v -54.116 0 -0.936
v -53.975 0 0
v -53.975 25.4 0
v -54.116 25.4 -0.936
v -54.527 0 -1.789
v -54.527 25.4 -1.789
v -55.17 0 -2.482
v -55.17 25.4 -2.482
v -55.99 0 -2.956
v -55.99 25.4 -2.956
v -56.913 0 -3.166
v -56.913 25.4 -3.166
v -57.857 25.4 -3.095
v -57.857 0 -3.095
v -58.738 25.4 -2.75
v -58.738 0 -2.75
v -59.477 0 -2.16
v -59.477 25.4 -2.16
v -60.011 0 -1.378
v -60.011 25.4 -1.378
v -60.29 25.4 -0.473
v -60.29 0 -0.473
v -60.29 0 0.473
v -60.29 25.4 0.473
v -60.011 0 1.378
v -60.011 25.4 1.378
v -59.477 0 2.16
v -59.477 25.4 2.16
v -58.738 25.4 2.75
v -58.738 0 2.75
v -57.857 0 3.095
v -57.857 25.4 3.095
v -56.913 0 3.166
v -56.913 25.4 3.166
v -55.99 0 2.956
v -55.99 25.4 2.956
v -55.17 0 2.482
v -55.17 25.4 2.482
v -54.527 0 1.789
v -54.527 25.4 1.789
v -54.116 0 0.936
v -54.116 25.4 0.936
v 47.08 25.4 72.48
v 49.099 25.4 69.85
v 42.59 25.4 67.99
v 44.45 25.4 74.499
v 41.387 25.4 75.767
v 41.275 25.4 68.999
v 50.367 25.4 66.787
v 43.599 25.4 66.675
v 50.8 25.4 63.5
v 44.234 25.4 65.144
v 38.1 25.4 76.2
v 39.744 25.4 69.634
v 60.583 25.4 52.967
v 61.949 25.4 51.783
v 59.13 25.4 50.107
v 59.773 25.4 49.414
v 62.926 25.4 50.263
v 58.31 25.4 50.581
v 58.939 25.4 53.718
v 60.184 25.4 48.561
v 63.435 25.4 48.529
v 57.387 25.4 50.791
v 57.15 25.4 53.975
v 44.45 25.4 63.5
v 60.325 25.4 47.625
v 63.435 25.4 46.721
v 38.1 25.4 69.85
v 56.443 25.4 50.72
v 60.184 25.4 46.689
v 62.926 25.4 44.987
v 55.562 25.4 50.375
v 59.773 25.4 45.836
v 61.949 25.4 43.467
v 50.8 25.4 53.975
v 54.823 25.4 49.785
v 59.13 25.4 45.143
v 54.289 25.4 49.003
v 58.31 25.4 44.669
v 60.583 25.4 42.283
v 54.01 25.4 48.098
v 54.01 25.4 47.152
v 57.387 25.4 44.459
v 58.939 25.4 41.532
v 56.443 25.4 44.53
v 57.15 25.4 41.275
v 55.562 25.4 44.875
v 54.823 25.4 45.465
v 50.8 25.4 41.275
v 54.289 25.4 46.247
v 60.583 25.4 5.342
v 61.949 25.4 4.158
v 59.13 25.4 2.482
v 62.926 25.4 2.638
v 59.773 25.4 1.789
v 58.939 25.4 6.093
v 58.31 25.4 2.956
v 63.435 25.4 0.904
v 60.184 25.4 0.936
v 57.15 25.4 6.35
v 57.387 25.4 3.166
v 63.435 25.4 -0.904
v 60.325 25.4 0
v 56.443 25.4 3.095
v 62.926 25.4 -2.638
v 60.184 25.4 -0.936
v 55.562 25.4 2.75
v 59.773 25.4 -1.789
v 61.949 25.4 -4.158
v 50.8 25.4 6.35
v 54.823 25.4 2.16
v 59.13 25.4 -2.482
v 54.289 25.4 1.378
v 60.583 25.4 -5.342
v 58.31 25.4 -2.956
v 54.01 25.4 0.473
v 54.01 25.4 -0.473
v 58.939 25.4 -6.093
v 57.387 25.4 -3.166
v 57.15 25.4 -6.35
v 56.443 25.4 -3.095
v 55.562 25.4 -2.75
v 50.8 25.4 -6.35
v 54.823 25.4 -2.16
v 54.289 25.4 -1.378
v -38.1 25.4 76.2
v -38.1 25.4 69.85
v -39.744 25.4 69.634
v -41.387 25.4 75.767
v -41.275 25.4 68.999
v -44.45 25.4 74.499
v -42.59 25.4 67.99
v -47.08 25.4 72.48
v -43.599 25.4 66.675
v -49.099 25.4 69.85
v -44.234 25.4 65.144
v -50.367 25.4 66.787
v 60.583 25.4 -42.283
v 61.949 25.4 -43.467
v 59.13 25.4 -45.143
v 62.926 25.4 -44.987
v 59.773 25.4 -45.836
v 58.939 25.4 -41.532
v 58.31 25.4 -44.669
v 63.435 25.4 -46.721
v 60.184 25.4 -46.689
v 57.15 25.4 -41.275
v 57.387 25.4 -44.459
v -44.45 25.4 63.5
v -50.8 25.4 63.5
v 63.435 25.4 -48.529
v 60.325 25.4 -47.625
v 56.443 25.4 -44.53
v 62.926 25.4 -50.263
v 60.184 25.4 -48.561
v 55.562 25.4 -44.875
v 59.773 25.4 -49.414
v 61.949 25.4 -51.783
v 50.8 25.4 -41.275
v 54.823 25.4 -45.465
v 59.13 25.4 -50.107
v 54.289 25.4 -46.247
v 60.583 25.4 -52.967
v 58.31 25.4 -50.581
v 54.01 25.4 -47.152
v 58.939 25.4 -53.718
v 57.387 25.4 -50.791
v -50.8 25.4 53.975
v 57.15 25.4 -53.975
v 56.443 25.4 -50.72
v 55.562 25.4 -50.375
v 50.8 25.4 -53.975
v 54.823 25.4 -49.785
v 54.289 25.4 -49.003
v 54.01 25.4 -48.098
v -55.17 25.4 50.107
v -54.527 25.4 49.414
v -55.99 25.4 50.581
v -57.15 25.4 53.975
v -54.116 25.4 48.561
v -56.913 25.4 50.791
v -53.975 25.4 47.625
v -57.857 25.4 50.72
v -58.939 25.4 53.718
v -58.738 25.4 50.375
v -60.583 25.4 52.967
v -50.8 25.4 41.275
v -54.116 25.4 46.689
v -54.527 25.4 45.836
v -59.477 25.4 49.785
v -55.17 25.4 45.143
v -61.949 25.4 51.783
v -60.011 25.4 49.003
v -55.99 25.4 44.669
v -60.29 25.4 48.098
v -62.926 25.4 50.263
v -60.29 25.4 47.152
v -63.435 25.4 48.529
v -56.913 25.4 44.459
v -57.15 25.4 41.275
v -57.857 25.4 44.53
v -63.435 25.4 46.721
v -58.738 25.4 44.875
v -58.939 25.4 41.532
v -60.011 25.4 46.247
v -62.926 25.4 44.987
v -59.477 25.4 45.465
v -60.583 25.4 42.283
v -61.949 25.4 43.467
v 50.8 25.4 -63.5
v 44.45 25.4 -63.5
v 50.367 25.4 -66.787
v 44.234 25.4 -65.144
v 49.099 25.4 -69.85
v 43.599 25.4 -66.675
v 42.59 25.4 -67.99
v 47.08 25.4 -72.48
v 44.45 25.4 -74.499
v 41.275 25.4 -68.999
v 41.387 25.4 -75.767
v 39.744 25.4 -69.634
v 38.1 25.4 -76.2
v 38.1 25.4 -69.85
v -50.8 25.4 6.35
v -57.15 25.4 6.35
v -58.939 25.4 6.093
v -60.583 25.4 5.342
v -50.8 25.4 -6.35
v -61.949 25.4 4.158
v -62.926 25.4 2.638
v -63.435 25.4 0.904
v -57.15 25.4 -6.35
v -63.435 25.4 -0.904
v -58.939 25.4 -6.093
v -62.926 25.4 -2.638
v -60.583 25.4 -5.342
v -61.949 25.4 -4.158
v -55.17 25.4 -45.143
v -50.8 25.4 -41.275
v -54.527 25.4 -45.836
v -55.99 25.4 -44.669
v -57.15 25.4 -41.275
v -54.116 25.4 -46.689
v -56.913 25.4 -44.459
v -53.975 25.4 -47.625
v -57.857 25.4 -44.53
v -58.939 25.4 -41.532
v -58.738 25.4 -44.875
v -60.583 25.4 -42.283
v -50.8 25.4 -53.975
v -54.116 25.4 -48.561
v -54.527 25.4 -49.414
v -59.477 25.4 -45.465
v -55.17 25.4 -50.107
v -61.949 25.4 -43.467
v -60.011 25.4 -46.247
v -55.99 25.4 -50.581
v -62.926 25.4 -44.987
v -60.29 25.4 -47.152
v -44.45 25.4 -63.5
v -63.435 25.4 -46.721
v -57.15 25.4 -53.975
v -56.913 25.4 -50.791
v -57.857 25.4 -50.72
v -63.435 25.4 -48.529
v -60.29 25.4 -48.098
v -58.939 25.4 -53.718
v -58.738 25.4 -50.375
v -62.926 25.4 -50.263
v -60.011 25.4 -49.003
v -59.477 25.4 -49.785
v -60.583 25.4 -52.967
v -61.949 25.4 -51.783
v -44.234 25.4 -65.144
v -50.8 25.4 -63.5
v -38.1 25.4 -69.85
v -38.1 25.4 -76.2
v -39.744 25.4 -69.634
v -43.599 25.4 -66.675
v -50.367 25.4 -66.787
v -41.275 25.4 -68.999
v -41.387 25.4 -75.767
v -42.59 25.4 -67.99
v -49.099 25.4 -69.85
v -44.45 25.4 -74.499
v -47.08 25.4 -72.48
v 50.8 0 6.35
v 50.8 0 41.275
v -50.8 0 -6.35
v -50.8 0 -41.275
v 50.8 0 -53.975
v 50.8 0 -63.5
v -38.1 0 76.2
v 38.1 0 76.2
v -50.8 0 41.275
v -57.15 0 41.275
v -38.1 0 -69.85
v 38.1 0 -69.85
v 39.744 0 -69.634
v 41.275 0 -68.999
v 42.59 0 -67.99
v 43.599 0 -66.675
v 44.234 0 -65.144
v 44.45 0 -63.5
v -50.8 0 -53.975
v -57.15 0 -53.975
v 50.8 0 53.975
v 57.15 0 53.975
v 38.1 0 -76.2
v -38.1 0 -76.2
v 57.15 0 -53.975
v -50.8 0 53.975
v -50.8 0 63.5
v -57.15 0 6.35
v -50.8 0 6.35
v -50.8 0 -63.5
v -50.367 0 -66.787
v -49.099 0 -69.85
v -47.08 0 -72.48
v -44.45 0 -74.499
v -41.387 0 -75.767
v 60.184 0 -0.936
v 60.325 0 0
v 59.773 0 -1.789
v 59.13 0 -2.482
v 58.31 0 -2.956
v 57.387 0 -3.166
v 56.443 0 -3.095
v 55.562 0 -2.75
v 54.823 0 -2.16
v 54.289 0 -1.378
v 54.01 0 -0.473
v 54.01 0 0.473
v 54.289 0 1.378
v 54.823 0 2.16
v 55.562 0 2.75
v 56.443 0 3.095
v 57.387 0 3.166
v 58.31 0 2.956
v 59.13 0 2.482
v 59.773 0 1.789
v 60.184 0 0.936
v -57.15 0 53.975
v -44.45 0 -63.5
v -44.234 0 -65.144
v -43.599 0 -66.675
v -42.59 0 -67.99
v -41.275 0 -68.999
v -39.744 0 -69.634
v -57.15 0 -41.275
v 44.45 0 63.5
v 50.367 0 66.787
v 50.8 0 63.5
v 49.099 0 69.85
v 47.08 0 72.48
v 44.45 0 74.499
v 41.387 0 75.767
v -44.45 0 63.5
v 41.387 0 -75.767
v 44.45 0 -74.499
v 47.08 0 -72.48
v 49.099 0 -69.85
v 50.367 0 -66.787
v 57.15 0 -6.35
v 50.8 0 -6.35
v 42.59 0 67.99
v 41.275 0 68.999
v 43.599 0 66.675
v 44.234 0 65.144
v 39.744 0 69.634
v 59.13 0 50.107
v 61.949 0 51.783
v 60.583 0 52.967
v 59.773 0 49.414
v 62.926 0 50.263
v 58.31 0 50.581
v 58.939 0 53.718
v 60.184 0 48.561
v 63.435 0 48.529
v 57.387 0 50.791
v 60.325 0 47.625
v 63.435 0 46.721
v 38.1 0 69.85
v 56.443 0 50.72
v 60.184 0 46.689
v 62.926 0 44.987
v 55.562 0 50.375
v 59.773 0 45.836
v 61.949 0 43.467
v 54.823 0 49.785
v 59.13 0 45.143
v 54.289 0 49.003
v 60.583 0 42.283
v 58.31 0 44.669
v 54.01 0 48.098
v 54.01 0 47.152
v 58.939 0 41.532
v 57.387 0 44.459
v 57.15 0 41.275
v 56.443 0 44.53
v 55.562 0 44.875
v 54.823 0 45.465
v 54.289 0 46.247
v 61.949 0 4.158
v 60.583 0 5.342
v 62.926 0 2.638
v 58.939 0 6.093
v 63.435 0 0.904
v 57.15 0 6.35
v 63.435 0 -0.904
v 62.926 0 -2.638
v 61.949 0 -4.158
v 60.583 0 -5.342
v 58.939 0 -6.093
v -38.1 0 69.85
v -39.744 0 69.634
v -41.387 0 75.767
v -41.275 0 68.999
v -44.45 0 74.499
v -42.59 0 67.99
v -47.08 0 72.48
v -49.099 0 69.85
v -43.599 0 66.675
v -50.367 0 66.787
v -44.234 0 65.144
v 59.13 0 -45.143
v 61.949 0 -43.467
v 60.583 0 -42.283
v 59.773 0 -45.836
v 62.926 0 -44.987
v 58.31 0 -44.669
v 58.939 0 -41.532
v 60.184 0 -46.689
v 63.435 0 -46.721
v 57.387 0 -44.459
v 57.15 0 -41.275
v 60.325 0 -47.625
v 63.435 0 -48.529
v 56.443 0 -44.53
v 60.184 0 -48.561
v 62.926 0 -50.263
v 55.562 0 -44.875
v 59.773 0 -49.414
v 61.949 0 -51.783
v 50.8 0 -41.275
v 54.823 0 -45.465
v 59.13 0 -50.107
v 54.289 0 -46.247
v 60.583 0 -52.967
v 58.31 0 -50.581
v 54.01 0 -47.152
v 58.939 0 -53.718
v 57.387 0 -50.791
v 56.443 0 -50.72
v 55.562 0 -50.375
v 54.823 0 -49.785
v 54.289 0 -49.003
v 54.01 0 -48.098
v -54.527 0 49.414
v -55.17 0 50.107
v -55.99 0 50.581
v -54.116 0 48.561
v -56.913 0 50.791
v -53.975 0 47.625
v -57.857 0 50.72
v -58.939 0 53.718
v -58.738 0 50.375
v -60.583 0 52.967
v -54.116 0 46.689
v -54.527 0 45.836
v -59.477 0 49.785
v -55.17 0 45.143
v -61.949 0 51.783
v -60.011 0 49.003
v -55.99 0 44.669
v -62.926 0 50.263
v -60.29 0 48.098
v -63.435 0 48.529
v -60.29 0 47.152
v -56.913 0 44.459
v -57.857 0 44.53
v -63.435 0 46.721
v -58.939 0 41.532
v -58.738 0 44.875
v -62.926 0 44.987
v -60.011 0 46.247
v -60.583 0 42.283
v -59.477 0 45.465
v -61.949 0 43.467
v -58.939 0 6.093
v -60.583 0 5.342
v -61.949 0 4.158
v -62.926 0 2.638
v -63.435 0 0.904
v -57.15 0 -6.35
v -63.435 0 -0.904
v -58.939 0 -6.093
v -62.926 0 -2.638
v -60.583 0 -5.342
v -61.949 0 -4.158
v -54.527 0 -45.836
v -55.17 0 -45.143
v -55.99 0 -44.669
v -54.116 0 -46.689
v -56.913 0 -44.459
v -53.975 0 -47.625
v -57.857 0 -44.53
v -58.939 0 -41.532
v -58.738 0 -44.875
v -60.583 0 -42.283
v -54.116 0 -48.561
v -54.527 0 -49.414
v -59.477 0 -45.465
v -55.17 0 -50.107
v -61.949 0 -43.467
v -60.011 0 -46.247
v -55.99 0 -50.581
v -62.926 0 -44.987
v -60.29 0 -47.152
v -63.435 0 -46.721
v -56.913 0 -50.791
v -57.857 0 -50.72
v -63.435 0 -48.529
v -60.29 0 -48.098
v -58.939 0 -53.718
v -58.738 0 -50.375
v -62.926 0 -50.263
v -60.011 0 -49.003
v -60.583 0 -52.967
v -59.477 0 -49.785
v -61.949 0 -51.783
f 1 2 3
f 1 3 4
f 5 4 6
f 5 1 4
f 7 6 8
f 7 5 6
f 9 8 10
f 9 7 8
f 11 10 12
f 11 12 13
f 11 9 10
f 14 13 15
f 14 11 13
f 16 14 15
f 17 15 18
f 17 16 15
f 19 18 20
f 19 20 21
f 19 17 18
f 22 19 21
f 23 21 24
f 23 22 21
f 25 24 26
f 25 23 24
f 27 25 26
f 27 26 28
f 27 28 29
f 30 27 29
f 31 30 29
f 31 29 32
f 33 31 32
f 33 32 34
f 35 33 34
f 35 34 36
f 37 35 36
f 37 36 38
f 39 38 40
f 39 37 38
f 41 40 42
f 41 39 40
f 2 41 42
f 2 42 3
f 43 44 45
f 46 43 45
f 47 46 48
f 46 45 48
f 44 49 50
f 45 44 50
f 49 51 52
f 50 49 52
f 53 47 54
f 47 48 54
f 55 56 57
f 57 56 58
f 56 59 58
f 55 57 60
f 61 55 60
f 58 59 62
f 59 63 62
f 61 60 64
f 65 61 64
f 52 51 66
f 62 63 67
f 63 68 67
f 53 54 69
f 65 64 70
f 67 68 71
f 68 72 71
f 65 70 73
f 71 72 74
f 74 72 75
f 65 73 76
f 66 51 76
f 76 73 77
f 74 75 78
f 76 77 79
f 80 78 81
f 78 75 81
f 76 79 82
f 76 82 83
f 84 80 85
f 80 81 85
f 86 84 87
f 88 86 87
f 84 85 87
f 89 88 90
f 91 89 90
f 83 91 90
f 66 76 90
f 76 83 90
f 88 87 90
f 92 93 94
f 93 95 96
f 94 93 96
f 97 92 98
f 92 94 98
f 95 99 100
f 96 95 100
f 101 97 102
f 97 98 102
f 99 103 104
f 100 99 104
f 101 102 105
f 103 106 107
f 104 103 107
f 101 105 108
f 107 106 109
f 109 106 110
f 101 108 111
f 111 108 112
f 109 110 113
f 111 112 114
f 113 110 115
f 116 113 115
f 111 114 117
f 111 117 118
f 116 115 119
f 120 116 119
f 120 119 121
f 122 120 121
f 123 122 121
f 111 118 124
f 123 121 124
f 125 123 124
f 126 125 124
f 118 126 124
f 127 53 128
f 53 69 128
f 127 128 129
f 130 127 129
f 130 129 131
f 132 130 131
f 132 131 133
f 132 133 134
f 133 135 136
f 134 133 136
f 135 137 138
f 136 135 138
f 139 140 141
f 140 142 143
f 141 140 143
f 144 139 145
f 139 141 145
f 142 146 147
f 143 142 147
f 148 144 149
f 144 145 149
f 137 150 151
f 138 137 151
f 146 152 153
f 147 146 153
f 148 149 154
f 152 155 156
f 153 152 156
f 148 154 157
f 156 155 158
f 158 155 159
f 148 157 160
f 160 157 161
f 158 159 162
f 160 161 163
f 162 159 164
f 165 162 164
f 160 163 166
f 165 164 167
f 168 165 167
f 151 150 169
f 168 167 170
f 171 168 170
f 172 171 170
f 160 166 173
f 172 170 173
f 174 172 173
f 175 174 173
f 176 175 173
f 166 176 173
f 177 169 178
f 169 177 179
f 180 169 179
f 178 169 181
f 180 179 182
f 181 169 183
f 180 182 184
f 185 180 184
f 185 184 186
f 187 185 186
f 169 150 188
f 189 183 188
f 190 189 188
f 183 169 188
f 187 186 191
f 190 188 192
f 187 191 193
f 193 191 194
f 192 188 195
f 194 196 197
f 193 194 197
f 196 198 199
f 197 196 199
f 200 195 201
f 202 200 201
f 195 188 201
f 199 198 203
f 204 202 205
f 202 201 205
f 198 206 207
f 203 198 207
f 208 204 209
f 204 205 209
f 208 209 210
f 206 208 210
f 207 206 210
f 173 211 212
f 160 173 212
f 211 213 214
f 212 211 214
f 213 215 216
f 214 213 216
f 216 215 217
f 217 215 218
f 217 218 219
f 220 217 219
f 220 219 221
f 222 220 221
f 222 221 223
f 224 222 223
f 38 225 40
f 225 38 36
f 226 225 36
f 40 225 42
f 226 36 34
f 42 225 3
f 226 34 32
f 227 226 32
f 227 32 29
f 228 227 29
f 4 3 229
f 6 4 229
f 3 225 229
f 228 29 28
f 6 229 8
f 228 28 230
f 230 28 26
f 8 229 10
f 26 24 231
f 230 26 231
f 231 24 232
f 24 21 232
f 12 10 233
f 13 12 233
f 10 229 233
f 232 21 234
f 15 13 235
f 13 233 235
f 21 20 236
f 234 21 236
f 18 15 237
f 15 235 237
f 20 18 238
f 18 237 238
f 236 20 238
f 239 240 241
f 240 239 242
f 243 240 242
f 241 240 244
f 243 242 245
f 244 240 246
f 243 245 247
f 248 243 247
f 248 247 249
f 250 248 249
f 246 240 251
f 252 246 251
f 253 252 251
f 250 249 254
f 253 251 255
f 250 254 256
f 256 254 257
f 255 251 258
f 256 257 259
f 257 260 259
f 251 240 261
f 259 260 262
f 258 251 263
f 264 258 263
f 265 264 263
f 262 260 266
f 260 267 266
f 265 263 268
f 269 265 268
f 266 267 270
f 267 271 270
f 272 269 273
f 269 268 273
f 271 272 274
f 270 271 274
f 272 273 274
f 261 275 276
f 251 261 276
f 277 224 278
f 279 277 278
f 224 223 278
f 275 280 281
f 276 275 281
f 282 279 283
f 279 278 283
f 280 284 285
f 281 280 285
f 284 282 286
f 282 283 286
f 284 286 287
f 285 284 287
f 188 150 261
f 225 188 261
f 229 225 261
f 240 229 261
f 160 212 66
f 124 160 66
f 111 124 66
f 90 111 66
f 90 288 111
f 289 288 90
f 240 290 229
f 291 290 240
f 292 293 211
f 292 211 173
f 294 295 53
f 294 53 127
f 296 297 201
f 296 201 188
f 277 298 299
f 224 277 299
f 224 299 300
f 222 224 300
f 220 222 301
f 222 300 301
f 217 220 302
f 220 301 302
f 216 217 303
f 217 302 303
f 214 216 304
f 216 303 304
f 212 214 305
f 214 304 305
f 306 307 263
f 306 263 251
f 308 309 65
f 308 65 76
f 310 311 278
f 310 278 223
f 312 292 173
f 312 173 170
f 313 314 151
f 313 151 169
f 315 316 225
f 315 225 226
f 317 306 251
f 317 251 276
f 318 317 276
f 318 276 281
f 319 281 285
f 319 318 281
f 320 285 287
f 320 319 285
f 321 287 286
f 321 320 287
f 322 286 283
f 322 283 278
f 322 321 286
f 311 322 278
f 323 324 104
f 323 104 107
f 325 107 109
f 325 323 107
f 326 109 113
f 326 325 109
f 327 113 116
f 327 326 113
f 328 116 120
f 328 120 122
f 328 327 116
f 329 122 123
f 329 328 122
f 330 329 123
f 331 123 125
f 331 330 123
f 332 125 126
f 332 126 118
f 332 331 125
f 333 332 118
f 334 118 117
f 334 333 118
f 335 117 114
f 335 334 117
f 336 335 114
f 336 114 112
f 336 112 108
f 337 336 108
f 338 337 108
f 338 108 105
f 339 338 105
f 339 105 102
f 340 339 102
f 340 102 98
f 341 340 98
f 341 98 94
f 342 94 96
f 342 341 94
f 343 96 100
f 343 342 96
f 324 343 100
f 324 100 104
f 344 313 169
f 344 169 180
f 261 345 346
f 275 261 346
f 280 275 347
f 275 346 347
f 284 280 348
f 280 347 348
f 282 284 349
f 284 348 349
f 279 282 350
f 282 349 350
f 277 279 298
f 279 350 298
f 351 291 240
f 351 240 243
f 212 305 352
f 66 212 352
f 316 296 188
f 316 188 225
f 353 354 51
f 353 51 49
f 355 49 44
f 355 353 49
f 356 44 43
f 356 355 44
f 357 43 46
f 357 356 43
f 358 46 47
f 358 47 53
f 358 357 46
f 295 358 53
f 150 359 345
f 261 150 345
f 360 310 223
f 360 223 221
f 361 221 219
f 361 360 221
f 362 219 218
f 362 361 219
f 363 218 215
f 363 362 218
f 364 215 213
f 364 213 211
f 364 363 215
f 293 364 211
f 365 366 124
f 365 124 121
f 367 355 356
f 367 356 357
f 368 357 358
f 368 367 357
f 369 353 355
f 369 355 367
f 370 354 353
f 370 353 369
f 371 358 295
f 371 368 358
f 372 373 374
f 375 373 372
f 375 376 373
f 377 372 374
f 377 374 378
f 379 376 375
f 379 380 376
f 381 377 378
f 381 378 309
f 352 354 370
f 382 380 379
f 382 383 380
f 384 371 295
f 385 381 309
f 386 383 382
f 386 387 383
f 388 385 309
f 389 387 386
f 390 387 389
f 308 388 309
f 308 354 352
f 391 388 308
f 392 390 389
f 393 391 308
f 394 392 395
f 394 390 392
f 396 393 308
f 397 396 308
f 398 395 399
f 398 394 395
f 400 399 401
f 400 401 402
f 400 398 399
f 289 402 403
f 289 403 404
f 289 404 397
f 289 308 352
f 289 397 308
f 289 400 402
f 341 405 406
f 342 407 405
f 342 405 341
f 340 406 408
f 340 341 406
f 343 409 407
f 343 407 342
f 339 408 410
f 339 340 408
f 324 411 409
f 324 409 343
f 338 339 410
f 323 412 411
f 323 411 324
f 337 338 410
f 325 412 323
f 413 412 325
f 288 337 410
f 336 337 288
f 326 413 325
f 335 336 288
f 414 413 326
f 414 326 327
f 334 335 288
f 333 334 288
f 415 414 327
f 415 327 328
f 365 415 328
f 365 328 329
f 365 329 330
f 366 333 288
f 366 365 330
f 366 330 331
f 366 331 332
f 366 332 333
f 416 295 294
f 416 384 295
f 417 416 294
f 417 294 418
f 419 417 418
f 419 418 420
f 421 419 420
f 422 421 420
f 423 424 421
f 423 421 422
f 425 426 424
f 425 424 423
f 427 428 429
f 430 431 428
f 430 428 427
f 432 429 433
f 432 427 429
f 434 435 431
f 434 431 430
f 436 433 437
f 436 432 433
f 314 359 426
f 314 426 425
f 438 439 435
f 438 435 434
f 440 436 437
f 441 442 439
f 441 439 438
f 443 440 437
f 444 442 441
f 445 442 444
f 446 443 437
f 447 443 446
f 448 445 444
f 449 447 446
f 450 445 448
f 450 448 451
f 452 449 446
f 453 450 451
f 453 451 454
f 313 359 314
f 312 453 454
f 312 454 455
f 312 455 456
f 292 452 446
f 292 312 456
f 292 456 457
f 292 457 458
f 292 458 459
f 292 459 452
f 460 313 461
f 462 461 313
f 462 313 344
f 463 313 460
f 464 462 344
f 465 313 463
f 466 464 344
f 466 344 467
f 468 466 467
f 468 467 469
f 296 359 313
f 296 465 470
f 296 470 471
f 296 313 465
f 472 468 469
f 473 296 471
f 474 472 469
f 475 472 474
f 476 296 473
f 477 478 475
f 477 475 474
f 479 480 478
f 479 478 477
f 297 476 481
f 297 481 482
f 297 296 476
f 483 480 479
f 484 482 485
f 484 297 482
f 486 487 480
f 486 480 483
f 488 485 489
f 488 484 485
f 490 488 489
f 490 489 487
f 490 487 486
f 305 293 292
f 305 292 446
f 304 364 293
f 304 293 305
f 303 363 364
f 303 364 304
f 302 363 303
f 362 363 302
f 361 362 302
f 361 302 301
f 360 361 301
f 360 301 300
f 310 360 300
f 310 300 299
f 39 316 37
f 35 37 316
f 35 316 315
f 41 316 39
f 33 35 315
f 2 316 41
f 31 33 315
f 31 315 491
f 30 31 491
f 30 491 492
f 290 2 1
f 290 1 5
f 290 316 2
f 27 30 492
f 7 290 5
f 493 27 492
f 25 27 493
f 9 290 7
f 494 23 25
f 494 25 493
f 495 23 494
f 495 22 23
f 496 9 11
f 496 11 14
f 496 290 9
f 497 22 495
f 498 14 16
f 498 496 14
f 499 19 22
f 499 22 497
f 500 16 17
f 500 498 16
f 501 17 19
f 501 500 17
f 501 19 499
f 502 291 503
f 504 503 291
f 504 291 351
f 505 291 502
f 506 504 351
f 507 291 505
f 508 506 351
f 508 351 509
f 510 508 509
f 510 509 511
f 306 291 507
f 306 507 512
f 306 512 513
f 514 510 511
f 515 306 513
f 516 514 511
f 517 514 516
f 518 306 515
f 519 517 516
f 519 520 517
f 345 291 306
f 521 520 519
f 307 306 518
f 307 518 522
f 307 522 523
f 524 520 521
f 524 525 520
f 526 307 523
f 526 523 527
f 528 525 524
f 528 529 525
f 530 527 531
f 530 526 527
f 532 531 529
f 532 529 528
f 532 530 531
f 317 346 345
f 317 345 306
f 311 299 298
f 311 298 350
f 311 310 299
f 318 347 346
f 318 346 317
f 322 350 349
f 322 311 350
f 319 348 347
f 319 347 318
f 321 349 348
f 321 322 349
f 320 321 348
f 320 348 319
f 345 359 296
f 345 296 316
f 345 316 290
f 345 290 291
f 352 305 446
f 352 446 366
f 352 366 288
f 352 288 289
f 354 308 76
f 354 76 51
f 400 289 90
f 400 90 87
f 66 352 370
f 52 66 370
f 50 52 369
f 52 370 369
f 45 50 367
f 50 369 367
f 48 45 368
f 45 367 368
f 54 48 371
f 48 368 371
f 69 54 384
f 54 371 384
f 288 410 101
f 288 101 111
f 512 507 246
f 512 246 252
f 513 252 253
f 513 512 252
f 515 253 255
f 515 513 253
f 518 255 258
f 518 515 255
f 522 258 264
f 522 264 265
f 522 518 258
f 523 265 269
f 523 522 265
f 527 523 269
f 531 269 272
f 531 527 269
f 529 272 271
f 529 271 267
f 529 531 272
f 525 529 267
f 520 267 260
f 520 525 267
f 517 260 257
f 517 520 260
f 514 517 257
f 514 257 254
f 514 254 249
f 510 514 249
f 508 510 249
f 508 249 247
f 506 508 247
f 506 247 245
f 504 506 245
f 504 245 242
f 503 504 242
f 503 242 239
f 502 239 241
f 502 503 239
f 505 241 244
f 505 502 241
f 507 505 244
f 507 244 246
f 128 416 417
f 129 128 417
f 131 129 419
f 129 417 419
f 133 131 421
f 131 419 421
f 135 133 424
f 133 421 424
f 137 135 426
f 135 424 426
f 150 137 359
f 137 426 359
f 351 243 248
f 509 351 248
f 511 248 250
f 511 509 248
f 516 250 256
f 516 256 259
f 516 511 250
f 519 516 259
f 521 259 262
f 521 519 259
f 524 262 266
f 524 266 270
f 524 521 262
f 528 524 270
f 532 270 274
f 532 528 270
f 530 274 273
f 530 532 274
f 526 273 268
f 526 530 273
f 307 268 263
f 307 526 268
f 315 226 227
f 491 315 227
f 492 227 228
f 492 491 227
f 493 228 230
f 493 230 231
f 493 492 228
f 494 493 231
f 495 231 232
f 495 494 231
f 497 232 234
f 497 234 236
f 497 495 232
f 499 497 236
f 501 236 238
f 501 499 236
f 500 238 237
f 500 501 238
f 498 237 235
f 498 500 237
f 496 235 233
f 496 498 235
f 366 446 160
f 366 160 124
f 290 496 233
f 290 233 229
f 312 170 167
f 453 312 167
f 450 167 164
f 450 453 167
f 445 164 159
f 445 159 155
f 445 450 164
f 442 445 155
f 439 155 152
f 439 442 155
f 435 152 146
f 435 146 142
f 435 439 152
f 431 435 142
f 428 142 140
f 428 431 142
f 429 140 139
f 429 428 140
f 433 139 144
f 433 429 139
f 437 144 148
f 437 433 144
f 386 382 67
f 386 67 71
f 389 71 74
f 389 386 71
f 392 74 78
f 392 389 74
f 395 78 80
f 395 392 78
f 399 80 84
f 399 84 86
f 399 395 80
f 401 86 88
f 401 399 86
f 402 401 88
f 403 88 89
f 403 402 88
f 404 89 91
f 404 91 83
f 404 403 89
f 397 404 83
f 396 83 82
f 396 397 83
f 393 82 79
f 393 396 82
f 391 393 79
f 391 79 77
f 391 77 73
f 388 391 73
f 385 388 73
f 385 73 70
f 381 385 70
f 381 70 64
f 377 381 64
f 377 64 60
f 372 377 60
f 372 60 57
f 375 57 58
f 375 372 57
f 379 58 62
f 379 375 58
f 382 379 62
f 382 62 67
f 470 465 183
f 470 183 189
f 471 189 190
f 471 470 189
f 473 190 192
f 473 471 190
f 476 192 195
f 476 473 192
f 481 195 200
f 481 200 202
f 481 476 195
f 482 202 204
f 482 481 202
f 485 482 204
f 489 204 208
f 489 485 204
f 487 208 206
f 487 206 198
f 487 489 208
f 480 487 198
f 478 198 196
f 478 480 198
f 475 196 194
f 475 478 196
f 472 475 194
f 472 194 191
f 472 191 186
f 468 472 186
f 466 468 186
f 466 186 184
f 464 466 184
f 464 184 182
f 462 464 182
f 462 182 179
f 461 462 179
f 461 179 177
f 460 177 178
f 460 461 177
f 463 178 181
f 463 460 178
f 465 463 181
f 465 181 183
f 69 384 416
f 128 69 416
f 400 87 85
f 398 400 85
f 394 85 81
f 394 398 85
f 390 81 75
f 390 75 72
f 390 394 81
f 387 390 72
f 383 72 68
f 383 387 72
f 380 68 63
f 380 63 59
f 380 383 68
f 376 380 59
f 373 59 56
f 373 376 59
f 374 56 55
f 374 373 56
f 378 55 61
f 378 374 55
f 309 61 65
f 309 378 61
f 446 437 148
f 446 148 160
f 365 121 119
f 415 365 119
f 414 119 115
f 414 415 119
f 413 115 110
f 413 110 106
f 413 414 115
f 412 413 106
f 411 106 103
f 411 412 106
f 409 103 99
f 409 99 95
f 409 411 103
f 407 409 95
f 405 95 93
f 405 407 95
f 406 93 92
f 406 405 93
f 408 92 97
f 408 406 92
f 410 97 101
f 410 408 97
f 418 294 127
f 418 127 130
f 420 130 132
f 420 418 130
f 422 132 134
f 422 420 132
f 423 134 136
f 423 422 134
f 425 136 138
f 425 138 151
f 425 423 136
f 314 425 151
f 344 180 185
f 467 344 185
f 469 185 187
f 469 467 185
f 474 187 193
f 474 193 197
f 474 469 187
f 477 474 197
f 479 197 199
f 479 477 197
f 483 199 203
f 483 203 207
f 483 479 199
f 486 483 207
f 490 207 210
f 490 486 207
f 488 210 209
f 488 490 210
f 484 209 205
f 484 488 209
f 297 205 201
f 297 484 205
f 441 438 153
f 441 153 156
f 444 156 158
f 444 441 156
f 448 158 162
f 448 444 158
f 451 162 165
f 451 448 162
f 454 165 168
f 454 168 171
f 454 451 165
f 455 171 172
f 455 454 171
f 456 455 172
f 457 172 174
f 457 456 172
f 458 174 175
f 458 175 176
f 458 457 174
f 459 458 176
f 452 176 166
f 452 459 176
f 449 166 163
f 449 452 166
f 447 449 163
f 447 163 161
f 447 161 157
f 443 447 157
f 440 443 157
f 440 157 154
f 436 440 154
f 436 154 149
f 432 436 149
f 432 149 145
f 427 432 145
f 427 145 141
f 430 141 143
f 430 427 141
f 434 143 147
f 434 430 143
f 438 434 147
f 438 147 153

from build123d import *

# Parameters (mm, degrees)
SKETCH1_R           = 3.175
BOSS_EXTRUDE1_DEPTH = 25.4


with BuildPart() as part:
    # Sketch1 → Boss-Extrude1 (new body)
    with BuildSketch(Plane(origin=(0, 0, 0), x_dir=(1, 0, 0), z_dir=(0, 1, 0))):
        with BuildLine():
            Line((0, 76.2), (38.1, 76.2))
            ThreePointArc((38.1, 76.2), (47.080256121, 72.480256121), (50.8, 63.5))
            Line((50.8, 63.5), (50.8, 53.975))
            Line((50.8, 53.975), (57.15, 53.975))
            ThreePointArc((57.15, 53.975), (63.5, 47.625), (57.15, 41.275))
            Line((57.15, 41.275), (50.8, 41.275))
            Line((50.8, 41.275), (50.8, 6.35))
            Line((50.8, 6.35), (57.15, 6.35))
            ThreePointArc((57.15, 6.35), (63.5, 0), (57.15, -6.35))
            Line((57.15, -6.35), (50.8, -6.35))
            Line((50.8, -6.35), (50.8, -41.275))
            Line((50.8, -41.275), (57.15, -41.275))
            ThreePointArc((57.15, -41.275), (63.5, -47.625), (57.15, -53.975))
            Line((57.15, -53.975), (50.8, -53.975))
            Line((50.8, -53.975), (50.8, -63.5))
            ThreePointArc((50.8, -63.5), (47.080256121, -72.480256121), (38.1, -76.2))
            Line((38.1, -76.2), (-4.318973468, -76.2))
            Line((-4.318973468, -76.2), (-38.1, -76.2))
            ThreePointArc((-38.1, -76.2), (-47.080256121, -72.480256121), (-50.8, -63.5))
            Line((-50.8, -63.5), (-50.8, -53.975))
            Line((-50.8, -53.975), (-57.15, -53.975))
            ThreePointArc((-57.15, -53.975), (-63.5, -47.625), (-57.15, -41.275))
            Line((-57.15, -41.275), (-50.8, -41.275))
            Line((-50.8, -41.275), (-50.8, -6.35))
            Line((-50.8, -6.35), (-57.15, -6.35))
            ThreePointArc((-57.15, -6.35), (-63.5, 0), (-57.15, 6.35))
            Line((-57.15, 6.35), (-50.8, 6.35))
            Line((-50.8, 6.35), (-50.8, 41.275))
            Line((-50.8, 41.275), (-57.15, 41.275))
            ThreePointArc((-57.15, 41.275), (-63.5, 47.625), (-57.15, 53.975))
            Line((-57.15, 53.975), (-50.8, 53.975))
            Line((-50.8, 53.975), (-50.8, 63.5))
            ThreePointArc((-50.8, 63.5), (-47.080256121, 72.480256121), (-38.1, 76.2))
            Line((-38.1, 76.2), (0, 76.2))
        make_face()
        with Locations((57.15, 47.625)):
            Circle(SKETCH1_R, mode=Mode.SUBTRACT)
        with Locations((57.15, 0)):
            Circle(SKETCH1_R, mode=Mode.SUBTRACT)
        with Locations((57.15, -47.625)):
            Circle(SKETCH1_R, mode=Mode.SUBTRACT)
        with Locations((-57.15, -47.625)):
            Circle(SKETCH1_R, mode=Mode.SUBTRACT)
        with Locations((-57.15, 47.625)):
            Circle(SKETCH1_R, mode=Mode.SUBTRACT)
        with Locations((-57.15, 0)):
            Circle(SKETCH1_R, mode=Mode.SUBTRACT)
        with BuildLine():
            Line((0, 69.85), (38.1, 69.85))
            ThreePointArc((38.1, 69.85), (42.590128061, 67.990128061), (44.45, 63.5))
            Line((44.45, 63.5), (44.45, -63.5))
            ThreePointArc((44.45, -63.5), (42.590128061, -67.990128061), (38.1, -69.85))
            Line((38.1, -69.85), (-4.318973468, -69.85))
            Line((-4.318973468, -69.85), (-38.1, -69.85))
            ThreePointArc((-38.1, -69.85), (-42.590128061, -67.990128061), (-44.45, -63.5))
            Line((-44.45, -63.5), (-44.45, 63.5))
            ThreePointArc((-44.45, 63.5), (-42.590128061, 67.990128061), (-38.1, 69.85))
            Line((-38.1, 69.85), (0, 69.85))
        make_face(mode=Mode.SUBTRACT)
    extrude(amount=BOSS_EXTRUDE1_DEPTH)


solid = part.part
